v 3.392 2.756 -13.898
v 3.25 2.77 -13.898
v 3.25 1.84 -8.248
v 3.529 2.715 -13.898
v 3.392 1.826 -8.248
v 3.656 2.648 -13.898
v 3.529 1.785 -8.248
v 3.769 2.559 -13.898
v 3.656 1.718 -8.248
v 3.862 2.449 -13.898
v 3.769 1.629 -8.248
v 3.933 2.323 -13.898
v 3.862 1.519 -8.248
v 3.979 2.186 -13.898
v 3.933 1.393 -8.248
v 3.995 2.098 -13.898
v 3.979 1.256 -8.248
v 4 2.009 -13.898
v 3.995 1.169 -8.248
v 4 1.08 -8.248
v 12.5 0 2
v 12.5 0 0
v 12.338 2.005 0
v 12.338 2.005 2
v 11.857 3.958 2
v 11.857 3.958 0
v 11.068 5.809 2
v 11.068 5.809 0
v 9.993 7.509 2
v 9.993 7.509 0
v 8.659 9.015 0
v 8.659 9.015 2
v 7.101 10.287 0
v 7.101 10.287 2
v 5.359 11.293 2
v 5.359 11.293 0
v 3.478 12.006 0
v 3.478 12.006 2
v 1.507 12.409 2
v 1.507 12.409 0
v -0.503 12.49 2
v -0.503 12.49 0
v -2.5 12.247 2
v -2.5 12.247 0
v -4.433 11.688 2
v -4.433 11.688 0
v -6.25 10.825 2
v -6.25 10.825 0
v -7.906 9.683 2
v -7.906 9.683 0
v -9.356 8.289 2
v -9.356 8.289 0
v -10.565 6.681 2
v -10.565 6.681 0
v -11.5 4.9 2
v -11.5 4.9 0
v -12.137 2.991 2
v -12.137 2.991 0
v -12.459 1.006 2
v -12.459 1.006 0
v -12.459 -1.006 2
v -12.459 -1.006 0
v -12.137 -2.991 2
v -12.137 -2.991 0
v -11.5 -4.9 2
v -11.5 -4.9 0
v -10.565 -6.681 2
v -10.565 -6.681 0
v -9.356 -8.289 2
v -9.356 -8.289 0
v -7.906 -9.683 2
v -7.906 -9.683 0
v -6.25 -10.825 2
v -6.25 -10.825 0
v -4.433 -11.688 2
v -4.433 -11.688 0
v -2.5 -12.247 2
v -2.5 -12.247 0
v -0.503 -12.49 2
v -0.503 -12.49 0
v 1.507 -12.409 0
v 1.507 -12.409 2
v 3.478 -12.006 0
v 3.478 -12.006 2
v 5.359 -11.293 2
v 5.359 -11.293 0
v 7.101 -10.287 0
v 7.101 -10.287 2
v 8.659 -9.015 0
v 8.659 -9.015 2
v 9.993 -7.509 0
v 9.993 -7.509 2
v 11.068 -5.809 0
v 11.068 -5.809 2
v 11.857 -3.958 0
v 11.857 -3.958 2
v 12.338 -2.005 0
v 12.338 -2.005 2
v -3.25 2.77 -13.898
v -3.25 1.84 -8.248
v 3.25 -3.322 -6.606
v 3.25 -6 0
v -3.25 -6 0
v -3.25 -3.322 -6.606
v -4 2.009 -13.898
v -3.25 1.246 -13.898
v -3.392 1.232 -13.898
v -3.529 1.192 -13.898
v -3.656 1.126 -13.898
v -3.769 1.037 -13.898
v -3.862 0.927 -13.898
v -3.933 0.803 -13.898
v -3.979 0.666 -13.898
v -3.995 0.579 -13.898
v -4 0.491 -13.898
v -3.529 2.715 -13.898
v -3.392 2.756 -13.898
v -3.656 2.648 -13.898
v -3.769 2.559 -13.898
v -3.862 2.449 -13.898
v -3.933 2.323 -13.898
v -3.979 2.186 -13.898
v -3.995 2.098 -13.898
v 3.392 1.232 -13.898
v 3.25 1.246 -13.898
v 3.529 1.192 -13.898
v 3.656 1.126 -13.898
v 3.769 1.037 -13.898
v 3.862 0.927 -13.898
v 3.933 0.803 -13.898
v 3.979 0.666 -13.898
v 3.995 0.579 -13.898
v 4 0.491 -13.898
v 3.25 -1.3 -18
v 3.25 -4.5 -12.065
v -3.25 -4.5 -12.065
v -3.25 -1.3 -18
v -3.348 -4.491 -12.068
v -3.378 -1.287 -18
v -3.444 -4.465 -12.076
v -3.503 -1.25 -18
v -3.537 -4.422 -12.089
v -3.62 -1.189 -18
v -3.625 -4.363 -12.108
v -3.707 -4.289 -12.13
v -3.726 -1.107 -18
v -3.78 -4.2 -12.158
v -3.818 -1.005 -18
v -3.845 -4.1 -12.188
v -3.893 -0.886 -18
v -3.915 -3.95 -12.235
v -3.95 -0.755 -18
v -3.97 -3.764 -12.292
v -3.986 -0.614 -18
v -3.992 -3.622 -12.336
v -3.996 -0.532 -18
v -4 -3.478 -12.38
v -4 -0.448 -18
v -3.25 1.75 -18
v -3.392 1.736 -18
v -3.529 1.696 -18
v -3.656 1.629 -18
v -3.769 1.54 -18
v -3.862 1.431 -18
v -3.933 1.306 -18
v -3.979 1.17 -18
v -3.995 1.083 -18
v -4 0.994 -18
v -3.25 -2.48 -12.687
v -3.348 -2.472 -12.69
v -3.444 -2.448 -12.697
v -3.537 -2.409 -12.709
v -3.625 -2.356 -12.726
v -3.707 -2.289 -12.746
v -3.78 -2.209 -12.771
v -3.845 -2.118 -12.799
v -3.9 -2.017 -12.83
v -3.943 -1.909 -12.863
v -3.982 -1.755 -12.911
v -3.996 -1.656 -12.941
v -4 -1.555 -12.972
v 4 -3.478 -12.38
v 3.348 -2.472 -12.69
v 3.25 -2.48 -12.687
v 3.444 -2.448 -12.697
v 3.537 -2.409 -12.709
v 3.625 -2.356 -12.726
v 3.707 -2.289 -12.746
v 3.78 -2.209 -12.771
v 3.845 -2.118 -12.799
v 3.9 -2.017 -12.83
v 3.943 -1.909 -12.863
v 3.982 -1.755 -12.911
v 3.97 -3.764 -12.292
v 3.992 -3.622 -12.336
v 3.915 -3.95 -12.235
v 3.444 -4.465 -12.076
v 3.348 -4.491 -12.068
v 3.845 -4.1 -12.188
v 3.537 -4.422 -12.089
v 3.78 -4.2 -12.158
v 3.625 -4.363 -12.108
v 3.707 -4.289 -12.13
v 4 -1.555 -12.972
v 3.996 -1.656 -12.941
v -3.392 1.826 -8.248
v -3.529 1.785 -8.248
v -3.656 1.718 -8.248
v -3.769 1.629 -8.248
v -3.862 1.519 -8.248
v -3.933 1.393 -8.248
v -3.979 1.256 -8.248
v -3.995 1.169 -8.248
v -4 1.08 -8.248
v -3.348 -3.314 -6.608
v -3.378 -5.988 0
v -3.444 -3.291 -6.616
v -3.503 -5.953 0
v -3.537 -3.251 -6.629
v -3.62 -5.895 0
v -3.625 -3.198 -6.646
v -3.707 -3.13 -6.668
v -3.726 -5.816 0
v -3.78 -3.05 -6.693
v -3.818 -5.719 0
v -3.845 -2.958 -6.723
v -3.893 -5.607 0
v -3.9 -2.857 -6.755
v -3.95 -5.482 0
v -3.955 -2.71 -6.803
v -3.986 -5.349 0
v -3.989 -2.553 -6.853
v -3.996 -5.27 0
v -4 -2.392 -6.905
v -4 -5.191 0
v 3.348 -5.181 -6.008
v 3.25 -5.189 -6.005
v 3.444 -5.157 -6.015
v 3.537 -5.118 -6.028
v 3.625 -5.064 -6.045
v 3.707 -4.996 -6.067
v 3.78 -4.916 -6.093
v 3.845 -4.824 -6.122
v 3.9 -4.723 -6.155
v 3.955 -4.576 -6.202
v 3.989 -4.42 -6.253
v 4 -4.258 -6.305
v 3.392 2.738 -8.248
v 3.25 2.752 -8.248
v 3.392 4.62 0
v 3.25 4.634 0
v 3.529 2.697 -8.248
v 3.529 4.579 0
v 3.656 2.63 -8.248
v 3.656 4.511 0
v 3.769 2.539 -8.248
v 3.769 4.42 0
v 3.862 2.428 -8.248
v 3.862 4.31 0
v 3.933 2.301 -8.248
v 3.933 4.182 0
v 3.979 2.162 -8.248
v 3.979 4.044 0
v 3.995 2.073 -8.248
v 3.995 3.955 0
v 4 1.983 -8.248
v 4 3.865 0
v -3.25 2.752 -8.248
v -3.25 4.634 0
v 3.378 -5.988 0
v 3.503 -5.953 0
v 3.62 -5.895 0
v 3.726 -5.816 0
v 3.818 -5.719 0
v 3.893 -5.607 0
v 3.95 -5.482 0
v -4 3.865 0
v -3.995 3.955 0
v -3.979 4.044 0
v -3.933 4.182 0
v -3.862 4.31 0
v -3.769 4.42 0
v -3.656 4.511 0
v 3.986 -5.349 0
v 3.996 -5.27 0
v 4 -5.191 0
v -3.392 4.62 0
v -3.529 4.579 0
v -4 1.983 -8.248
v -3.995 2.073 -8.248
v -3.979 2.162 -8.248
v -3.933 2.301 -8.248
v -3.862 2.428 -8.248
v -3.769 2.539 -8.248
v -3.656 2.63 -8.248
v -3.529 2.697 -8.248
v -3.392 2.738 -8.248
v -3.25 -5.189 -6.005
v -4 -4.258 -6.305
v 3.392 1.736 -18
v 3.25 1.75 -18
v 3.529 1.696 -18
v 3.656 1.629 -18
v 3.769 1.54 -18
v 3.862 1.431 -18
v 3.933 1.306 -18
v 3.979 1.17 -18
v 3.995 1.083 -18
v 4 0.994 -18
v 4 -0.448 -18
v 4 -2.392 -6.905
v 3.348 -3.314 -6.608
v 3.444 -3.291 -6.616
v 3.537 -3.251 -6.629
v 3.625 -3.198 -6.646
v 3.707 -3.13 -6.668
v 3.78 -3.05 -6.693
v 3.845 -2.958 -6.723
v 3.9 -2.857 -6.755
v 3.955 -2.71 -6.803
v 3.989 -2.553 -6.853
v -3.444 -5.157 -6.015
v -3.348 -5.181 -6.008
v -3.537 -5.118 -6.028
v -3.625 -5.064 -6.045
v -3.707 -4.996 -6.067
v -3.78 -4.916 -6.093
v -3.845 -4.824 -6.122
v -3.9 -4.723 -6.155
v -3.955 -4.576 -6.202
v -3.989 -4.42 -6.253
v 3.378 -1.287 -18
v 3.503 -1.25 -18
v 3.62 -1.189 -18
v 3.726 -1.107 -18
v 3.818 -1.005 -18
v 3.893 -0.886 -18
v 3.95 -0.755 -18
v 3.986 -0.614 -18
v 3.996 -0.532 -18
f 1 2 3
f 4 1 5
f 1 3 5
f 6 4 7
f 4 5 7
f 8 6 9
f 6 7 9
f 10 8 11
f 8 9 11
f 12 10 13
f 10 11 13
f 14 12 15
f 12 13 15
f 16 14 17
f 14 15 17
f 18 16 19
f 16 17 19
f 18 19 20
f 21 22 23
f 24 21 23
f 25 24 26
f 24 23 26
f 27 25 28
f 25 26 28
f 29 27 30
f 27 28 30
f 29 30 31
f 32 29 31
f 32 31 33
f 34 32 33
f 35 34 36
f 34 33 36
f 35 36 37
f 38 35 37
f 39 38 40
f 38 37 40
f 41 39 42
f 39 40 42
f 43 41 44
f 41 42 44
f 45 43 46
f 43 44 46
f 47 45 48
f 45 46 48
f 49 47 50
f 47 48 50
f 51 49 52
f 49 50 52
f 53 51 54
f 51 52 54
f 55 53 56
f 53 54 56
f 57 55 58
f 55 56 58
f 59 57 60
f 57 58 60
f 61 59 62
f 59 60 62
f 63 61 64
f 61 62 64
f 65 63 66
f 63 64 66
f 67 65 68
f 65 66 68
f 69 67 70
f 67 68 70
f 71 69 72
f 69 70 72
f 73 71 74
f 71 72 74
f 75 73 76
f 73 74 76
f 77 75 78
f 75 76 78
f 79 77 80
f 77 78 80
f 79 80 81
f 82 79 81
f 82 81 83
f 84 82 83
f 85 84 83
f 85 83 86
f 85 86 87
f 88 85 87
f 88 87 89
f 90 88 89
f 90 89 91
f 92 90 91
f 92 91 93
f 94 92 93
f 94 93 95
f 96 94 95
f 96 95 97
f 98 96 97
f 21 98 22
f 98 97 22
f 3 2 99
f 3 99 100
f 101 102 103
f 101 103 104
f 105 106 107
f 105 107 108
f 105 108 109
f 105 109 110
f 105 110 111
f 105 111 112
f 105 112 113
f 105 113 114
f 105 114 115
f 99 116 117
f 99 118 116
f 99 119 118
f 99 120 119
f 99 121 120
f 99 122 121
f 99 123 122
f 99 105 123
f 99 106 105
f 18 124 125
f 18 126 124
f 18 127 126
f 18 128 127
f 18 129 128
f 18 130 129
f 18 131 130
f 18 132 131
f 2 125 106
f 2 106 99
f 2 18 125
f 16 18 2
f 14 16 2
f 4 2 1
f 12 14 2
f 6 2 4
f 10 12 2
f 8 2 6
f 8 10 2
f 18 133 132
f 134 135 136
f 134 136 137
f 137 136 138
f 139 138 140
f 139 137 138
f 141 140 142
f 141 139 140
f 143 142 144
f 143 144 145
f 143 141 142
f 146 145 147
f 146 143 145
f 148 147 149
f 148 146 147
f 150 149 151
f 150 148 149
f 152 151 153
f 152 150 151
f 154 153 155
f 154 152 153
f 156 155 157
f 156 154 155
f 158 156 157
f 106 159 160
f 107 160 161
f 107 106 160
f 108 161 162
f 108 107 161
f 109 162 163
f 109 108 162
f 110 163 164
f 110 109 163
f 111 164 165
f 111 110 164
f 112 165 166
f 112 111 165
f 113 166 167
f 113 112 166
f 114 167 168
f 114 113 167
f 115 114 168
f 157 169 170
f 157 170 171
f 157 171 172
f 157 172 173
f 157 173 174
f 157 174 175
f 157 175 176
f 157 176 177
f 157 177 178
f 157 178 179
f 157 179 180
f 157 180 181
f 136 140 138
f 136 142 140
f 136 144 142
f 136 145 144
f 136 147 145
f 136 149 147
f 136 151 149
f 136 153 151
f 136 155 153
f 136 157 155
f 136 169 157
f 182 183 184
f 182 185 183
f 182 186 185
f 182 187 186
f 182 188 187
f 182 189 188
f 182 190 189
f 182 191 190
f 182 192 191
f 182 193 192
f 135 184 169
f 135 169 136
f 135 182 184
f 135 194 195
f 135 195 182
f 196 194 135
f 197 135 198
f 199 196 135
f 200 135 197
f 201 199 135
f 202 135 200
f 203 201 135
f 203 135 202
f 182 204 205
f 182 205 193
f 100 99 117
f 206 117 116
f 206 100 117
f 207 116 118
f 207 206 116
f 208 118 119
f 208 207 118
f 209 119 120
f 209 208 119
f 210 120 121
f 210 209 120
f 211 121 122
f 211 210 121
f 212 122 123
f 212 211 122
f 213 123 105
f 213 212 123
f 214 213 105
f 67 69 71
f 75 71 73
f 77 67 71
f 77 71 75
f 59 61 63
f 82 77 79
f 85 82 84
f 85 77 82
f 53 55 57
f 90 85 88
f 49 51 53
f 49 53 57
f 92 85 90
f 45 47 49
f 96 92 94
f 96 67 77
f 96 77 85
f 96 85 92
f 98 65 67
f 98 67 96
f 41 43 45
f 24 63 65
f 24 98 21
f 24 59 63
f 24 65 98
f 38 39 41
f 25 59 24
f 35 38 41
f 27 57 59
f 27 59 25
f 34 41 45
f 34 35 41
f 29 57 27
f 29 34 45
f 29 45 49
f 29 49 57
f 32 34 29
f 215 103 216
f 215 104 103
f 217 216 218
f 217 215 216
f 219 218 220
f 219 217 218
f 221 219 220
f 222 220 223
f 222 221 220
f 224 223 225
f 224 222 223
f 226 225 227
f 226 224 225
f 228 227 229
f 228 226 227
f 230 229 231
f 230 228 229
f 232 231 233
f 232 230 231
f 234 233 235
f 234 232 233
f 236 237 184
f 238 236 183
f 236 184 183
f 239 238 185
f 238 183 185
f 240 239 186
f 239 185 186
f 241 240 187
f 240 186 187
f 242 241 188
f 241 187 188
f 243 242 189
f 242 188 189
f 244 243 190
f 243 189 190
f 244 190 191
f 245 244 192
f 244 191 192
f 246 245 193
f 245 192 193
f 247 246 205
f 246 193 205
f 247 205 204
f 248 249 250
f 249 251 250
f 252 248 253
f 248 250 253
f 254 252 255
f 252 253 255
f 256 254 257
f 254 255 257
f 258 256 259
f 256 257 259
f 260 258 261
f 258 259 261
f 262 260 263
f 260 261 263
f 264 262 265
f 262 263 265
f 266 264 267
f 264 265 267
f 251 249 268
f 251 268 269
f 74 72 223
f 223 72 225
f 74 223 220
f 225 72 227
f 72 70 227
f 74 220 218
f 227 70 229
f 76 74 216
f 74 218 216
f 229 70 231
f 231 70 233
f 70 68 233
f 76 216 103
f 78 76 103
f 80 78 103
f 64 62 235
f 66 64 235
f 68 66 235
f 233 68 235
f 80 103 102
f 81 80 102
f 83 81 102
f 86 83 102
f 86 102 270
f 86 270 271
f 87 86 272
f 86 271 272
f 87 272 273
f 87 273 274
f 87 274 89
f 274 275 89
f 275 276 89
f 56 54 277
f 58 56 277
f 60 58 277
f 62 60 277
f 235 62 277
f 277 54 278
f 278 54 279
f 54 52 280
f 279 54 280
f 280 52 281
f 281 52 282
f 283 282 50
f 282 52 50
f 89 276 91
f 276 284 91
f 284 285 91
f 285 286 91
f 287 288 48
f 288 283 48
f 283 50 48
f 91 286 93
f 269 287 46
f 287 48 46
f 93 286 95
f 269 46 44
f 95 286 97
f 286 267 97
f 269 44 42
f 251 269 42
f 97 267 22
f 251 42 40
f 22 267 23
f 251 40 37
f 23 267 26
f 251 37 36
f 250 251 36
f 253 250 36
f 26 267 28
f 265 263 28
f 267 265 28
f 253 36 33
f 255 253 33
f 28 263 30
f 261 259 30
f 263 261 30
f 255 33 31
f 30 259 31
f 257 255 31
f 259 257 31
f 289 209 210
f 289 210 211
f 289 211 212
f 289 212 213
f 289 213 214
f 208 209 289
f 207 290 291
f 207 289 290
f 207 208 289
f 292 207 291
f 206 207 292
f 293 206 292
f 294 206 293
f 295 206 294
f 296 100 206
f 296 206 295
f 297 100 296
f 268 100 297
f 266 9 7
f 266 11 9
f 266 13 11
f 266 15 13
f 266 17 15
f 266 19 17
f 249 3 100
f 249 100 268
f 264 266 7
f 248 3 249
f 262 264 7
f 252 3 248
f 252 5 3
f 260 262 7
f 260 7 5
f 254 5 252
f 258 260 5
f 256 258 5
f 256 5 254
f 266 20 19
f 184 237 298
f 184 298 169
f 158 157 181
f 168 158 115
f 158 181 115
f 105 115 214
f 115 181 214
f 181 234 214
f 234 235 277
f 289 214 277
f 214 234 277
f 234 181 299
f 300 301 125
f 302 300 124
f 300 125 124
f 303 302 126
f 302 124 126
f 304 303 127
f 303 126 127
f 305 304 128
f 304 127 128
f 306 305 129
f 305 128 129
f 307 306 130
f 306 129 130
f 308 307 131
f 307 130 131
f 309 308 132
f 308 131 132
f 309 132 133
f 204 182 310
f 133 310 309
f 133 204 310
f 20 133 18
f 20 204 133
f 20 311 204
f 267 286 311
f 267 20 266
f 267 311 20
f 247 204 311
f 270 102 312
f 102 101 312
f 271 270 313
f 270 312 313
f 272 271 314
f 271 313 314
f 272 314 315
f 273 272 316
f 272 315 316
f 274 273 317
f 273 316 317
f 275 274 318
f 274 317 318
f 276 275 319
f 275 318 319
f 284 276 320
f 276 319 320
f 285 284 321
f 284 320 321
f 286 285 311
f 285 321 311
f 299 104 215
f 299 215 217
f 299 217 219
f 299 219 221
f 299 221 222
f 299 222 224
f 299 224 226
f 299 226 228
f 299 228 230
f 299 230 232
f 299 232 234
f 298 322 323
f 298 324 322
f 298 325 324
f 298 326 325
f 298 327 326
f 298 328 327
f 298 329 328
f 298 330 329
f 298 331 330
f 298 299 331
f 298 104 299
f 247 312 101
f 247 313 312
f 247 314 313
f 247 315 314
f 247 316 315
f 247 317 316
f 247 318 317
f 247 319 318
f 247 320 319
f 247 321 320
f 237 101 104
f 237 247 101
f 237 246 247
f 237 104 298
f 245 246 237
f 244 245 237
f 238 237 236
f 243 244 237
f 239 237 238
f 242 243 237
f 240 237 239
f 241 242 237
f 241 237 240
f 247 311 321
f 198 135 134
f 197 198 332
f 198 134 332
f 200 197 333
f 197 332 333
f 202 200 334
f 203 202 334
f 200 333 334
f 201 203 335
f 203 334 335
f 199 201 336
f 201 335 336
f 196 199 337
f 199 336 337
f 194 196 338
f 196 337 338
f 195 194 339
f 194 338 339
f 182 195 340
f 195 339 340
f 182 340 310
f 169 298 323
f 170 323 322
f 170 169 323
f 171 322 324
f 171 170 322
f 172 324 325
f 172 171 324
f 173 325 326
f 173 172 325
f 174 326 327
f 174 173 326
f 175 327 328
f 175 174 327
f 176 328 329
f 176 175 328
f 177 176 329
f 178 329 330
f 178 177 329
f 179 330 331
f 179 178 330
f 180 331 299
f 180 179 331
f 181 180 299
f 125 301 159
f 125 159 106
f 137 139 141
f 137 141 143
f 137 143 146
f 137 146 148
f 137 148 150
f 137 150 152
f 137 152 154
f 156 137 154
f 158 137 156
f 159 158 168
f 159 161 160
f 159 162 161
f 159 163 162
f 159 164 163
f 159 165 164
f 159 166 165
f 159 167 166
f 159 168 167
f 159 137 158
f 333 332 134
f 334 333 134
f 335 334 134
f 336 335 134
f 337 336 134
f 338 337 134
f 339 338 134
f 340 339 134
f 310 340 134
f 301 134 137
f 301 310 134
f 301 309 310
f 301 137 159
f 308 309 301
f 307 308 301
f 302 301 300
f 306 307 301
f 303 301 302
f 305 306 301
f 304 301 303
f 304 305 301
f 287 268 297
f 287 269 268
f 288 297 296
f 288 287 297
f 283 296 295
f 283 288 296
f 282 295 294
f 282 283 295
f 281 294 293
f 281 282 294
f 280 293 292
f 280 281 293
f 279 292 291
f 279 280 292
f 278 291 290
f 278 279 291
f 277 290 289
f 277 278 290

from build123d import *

# Parameters (mm, degrees)
F0_R          = 12.5
F1_DEPTH      = 2
F3_DEPTH      = 4
F3_DEPTH_BACK = 4
F4_R          = 0.75


with BuildPart() as f1:
    # F0 (on Top) → F1 (new body)
    with BuildSketch(Plane.XY):
        Circle(F0_R)
    extrude(amount=F1_DEPTH)

    # F2 (on Right) → F3 (join, two sides)
    with BuildSketch(Plane.YZ) as f3_sk:
        Polygon((4.633974, 0), (-6, 0), (-3.322237, -6.605754), (-5.188579, -6.005191), (-2.479827, -12.687395), (-4.499659, -12.065352), (-1.3, -18), (0, -18), (1.75, -18), (1.246213, -13.898331), (2.769501, -13.898331), (1.839659, -8.247796), (2.752447, -8.247796), align=None)
    extrude(amount=F3_DEPTH)
    extrude(f3_sk.sketch, amount=-F3_DEPTH_BACK)

    # F4
    f4_edges = [f1.edges().sort_by_distance(p)[0] for p in [
        (-4, 3.693211, -4.123898),
        (-4, -4.661119, -3.302877),
        (-4, 2.30458, -11.073063),
        (-4, -3.834203, -9.346293),
        (-4, 1.498106, -15.949165),
        (-4, -2.899829, -15.032676),
        (4, 3.693211, -4.123898),
        (4, 2.30458, -11.073063),
        (4, -2.899829, -15.032676),
        (4, 1.498106, -15.949165),
        (4, -3.834203, -9.346293),
        (4, -4.661119, -3.302877),
    ]]
    fillet(f4_edges, radius=F4_R)


solid = f1.part
